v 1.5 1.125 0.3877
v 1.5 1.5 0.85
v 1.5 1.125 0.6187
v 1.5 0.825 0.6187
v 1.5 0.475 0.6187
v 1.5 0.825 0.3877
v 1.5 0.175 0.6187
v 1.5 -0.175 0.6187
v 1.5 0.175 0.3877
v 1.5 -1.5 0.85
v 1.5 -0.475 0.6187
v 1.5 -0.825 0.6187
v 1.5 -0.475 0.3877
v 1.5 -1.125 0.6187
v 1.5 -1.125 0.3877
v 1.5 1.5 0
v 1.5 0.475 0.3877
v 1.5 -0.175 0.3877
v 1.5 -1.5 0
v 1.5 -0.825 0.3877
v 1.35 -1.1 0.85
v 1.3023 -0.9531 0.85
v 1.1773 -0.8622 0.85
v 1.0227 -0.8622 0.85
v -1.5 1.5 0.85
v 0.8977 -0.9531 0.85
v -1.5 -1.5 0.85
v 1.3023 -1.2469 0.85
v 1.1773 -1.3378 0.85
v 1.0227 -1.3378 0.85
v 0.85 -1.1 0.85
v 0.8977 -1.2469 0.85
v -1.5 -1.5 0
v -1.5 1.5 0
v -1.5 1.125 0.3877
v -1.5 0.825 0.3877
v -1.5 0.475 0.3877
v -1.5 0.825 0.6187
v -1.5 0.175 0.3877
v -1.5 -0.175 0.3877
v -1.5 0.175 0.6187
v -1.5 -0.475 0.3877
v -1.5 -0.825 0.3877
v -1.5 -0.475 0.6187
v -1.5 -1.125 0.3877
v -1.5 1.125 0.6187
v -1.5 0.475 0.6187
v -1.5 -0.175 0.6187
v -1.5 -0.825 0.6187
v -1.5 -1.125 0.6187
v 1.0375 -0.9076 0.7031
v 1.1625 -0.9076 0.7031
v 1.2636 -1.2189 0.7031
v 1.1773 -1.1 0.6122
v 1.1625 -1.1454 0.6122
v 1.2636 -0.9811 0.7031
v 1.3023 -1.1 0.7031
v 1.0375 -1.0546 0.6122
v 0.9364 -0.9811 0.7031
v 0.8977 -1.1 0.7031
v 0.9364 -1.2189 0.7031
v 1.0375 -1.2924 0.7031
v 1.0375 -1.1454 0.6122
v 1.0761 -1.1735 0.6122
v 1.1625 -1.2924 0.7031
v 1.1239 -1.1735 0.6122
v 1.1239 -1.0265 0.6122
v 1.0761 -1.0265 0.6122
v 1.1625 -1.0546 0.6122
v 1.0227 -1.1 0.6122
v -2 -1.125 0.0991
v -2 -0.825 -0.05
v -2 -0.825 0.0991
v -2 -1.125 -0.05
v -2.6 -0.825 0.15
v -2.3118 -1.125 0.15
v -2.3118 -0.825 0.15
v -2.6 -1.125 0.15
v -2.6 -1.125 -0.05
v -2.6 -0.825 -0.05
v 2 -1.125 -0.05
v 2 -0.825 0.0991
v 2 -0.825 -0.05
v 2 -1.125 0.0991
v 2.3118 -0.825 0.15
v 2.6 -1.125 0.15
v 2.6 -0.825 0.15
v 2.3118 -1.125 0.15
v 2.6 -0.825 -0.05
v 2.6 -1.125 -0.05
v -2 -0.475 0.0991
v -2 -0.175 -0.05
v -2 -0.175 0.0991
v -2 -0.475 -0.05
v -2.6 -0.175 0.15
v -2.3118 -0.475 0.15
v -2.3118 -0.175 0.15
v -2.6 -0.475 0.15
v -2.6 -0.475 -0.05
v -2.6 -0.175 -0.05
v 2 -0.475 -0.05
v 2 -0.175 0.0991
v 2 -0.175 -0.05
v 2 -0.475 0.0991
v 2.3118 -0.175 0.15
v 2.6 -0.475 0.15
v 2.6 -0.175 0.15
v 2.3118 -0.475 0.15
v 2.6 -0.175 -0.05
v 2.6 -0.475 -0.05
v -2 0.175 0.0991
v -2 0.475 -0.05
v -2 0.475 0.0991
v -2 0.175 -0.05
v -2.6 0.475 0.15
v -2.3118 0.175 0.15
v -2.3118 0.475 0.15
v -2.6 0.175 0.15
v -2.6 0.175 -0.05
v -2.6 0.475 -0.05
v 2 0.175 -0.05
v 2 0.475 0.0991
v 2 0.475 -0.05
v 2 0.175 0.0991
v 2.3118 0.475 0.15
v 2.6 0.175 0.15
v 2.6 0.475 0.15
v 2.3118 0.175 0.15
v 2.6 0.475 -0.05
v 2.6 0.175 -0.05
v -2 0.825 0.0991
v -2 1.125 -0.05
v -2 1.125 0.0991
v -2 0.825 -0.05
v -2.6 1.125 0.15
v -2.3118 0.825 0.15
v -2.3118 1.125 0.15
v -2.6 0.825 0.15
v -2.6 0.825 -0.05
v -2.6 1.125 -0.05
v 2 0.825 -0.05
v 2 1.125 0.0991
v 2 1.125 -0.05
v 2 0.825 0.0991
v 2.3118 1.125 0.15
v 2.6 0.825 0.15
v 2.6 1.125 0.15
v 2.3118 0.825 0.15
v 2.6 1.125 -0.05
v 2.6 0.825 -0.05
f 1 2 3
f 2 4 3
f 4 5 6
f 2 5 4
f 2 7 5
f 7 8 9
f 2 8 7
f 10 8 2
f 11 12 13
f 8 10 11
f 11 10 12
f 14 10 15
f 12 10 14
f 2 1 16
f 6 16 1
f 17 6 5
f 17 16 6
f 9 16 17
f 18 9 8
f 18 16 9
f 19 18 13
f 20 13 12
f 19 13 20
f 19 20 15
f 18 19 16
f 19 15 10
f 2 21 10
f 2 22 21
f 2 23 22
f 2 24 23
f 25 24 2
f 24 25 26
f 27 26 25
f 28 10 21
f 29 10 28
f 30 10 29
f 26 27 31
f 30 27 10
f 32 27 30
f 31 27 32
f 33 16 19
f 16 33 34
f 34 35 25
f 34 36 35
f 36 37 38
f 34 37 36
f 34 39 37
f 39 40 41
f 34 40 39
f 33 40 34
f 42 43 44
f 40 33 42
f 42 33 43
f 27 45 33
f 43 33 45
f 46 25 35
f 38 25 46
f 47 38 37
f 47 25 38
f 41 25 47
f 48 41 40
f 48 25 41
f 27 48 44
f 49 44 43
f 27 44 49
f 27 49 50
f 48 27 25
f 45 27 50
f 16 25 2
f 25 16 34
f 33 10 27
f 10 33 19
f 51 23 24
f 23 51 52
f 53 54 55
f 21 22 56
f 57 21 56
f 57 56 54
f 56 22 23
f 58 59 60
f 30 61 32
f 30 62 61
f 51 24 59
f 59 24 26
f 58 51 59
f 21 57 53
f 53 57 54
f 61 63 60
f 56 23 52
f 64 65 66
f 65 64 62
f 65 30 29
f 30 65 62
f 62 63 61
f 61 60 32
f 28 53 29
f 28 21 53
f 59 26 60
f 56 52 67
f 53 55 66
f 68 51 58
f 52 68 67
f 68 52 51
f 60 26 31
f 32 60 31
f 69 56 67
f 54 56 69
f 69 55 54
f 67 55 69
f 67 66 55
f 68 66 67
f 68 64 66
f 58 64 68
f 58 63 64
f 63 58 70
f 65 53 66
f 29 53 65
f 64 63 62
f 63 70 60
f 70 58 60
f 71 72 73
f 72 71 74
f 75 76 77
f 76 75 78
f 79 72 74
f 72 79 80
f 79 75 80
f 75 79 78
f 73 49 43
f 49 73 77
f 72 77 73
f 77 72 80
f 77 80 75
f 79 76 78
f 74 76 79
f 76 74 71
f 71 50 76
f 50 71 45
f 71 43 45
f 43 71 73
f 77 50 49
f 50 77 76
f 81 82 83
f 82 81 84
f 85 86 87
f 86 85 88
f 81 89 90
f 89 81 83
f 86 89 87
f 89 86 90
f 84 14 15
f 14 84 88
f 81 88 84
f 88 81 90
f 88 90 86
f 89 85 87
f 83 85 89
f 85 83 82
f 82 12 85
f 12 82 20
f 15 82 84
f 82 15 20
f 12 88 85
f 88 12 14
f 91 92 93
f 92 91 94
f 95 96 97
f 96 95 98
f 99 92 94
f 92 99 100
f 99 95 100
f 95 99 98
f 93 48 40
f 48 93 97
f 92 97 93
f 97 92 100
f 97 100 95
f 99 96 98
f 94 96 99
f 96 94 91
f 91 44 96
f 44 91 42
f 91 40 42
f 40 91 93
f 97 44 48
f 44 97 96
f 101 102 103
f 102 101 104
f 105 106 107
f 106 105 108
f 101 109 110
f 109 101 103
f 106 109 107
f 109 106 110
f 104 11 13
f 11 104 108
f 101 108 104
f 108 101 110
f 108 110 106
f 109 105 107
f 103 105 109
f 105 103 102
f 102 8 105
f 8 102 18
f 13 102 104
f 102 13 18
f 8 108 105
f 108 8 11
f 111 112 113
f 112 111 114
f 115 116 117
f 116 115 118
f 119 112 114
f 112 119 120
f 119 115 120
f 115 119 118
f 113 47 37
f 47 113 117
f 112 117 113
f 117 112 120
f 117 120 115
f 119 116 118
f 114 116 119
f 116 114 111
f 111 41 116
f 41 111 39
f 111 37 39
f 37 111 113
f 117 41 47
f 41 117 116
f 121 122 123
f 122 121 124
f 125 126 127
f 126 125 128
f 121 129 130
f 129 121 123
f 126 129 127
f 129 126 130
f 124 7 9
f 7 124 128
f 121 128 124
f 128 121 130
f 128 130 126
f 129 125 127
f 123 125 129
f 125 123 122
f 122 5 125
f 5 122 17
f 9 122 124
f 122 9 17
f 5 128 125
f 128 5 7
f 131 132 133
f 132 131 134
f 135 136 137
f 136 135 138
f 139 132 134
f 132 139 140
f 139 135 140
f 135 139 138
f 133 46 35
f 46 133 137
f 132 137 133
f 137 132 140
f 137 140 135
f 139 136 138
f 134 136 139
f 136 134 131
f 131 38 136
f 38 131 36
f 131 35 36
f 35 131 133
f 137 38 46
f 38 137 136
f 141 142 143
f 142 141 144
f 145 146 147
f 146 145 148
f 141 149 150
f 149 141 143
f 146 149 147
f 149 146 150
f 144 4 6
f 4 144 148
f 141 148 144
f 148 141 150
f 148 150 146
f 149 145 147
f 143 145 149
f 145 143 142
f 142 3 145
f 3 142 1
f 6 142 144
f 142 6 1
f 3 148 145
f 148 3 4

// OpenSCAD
/*
 * A generic SOP 4.5mm wide, 6.6mm long, 0.65mm pitch packaged part.
 *
 * Author: Ian McInerney
 * Created: July 16, 2015
 *
 */

module pin() {
	translate([0,0.0,0.0])cube([0.6,0.3,0.20], center=true);
	translate([0.5,0.0,0.28])rotate([0.0,60,0.0])translate([0.0,0.0,0.0])cube([0.2,0.3,1.1], center=true);
}


// Assemble the main package and the pins
module main() {
		translate([0.0,0.0,0.85/2])cube([3.0,3.0,0.85], center=true);
}

// Add the marker for pin 1
difference() {
	// The main cube
	main();

	// The pin 1 marker
	translate([1.1,-1.1,0.85])sphere(r=0.25, $fn=10);
}

// Create the pins
for ( i = [-0.975 : 0.65 : 0.976] )
{
    translate([-2.3,i,0.05])pin();
	 translate([2.3,i,0.05])rotate([0.0,0.0,180])pin();
}
